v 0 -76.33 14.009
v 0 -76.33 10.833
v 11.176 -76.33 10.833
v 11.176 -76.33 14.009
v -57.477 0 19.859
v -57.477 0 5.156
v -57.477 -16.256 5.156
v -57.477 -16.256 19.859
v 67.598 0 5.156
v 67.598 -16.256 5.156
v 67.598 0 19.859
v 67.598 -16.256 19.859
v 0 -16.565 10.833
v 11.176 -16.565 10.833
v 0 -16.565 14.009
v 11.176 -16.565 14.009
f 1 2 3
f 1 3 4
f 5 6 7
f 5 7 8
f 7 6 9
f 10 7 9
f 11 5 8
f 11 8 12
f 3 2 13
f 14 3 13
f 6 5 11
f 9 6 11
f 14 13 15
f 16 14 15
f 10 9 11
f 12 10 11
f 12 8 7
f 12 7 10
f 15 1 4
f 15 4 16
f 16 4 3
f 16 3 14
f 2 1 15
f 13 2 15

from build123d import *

# Parameters (mm, degrees)
F0_W     = 125.075299
F0_H     = 14.703508
F1_DEPTH = 16.256
F2_W     = 59.765493
F2_H     = 3.175618
F3_DEPTH = 11.176


with BuildPart() as f1:
    # F0 (on Front) → F1 (new body)
    with BuildSketch(Plane.XZ):
        with Locations((5.060299, 12.50753)):
            Rectangle(F0_W, F0_H)
    extrude(amount=F1_DEPTH)


with BuildPart() as f3:
    # F2 (on Right) → F3 (new body)
    with BuildSketch(Plane.YZ):
        with Locations((-46.447527, 12.420782)):
            Rectangle(F2_W, F2_H)
    extrude(amount=F3_DEPTH)


solid = Compound([f1.part, f3.part])
